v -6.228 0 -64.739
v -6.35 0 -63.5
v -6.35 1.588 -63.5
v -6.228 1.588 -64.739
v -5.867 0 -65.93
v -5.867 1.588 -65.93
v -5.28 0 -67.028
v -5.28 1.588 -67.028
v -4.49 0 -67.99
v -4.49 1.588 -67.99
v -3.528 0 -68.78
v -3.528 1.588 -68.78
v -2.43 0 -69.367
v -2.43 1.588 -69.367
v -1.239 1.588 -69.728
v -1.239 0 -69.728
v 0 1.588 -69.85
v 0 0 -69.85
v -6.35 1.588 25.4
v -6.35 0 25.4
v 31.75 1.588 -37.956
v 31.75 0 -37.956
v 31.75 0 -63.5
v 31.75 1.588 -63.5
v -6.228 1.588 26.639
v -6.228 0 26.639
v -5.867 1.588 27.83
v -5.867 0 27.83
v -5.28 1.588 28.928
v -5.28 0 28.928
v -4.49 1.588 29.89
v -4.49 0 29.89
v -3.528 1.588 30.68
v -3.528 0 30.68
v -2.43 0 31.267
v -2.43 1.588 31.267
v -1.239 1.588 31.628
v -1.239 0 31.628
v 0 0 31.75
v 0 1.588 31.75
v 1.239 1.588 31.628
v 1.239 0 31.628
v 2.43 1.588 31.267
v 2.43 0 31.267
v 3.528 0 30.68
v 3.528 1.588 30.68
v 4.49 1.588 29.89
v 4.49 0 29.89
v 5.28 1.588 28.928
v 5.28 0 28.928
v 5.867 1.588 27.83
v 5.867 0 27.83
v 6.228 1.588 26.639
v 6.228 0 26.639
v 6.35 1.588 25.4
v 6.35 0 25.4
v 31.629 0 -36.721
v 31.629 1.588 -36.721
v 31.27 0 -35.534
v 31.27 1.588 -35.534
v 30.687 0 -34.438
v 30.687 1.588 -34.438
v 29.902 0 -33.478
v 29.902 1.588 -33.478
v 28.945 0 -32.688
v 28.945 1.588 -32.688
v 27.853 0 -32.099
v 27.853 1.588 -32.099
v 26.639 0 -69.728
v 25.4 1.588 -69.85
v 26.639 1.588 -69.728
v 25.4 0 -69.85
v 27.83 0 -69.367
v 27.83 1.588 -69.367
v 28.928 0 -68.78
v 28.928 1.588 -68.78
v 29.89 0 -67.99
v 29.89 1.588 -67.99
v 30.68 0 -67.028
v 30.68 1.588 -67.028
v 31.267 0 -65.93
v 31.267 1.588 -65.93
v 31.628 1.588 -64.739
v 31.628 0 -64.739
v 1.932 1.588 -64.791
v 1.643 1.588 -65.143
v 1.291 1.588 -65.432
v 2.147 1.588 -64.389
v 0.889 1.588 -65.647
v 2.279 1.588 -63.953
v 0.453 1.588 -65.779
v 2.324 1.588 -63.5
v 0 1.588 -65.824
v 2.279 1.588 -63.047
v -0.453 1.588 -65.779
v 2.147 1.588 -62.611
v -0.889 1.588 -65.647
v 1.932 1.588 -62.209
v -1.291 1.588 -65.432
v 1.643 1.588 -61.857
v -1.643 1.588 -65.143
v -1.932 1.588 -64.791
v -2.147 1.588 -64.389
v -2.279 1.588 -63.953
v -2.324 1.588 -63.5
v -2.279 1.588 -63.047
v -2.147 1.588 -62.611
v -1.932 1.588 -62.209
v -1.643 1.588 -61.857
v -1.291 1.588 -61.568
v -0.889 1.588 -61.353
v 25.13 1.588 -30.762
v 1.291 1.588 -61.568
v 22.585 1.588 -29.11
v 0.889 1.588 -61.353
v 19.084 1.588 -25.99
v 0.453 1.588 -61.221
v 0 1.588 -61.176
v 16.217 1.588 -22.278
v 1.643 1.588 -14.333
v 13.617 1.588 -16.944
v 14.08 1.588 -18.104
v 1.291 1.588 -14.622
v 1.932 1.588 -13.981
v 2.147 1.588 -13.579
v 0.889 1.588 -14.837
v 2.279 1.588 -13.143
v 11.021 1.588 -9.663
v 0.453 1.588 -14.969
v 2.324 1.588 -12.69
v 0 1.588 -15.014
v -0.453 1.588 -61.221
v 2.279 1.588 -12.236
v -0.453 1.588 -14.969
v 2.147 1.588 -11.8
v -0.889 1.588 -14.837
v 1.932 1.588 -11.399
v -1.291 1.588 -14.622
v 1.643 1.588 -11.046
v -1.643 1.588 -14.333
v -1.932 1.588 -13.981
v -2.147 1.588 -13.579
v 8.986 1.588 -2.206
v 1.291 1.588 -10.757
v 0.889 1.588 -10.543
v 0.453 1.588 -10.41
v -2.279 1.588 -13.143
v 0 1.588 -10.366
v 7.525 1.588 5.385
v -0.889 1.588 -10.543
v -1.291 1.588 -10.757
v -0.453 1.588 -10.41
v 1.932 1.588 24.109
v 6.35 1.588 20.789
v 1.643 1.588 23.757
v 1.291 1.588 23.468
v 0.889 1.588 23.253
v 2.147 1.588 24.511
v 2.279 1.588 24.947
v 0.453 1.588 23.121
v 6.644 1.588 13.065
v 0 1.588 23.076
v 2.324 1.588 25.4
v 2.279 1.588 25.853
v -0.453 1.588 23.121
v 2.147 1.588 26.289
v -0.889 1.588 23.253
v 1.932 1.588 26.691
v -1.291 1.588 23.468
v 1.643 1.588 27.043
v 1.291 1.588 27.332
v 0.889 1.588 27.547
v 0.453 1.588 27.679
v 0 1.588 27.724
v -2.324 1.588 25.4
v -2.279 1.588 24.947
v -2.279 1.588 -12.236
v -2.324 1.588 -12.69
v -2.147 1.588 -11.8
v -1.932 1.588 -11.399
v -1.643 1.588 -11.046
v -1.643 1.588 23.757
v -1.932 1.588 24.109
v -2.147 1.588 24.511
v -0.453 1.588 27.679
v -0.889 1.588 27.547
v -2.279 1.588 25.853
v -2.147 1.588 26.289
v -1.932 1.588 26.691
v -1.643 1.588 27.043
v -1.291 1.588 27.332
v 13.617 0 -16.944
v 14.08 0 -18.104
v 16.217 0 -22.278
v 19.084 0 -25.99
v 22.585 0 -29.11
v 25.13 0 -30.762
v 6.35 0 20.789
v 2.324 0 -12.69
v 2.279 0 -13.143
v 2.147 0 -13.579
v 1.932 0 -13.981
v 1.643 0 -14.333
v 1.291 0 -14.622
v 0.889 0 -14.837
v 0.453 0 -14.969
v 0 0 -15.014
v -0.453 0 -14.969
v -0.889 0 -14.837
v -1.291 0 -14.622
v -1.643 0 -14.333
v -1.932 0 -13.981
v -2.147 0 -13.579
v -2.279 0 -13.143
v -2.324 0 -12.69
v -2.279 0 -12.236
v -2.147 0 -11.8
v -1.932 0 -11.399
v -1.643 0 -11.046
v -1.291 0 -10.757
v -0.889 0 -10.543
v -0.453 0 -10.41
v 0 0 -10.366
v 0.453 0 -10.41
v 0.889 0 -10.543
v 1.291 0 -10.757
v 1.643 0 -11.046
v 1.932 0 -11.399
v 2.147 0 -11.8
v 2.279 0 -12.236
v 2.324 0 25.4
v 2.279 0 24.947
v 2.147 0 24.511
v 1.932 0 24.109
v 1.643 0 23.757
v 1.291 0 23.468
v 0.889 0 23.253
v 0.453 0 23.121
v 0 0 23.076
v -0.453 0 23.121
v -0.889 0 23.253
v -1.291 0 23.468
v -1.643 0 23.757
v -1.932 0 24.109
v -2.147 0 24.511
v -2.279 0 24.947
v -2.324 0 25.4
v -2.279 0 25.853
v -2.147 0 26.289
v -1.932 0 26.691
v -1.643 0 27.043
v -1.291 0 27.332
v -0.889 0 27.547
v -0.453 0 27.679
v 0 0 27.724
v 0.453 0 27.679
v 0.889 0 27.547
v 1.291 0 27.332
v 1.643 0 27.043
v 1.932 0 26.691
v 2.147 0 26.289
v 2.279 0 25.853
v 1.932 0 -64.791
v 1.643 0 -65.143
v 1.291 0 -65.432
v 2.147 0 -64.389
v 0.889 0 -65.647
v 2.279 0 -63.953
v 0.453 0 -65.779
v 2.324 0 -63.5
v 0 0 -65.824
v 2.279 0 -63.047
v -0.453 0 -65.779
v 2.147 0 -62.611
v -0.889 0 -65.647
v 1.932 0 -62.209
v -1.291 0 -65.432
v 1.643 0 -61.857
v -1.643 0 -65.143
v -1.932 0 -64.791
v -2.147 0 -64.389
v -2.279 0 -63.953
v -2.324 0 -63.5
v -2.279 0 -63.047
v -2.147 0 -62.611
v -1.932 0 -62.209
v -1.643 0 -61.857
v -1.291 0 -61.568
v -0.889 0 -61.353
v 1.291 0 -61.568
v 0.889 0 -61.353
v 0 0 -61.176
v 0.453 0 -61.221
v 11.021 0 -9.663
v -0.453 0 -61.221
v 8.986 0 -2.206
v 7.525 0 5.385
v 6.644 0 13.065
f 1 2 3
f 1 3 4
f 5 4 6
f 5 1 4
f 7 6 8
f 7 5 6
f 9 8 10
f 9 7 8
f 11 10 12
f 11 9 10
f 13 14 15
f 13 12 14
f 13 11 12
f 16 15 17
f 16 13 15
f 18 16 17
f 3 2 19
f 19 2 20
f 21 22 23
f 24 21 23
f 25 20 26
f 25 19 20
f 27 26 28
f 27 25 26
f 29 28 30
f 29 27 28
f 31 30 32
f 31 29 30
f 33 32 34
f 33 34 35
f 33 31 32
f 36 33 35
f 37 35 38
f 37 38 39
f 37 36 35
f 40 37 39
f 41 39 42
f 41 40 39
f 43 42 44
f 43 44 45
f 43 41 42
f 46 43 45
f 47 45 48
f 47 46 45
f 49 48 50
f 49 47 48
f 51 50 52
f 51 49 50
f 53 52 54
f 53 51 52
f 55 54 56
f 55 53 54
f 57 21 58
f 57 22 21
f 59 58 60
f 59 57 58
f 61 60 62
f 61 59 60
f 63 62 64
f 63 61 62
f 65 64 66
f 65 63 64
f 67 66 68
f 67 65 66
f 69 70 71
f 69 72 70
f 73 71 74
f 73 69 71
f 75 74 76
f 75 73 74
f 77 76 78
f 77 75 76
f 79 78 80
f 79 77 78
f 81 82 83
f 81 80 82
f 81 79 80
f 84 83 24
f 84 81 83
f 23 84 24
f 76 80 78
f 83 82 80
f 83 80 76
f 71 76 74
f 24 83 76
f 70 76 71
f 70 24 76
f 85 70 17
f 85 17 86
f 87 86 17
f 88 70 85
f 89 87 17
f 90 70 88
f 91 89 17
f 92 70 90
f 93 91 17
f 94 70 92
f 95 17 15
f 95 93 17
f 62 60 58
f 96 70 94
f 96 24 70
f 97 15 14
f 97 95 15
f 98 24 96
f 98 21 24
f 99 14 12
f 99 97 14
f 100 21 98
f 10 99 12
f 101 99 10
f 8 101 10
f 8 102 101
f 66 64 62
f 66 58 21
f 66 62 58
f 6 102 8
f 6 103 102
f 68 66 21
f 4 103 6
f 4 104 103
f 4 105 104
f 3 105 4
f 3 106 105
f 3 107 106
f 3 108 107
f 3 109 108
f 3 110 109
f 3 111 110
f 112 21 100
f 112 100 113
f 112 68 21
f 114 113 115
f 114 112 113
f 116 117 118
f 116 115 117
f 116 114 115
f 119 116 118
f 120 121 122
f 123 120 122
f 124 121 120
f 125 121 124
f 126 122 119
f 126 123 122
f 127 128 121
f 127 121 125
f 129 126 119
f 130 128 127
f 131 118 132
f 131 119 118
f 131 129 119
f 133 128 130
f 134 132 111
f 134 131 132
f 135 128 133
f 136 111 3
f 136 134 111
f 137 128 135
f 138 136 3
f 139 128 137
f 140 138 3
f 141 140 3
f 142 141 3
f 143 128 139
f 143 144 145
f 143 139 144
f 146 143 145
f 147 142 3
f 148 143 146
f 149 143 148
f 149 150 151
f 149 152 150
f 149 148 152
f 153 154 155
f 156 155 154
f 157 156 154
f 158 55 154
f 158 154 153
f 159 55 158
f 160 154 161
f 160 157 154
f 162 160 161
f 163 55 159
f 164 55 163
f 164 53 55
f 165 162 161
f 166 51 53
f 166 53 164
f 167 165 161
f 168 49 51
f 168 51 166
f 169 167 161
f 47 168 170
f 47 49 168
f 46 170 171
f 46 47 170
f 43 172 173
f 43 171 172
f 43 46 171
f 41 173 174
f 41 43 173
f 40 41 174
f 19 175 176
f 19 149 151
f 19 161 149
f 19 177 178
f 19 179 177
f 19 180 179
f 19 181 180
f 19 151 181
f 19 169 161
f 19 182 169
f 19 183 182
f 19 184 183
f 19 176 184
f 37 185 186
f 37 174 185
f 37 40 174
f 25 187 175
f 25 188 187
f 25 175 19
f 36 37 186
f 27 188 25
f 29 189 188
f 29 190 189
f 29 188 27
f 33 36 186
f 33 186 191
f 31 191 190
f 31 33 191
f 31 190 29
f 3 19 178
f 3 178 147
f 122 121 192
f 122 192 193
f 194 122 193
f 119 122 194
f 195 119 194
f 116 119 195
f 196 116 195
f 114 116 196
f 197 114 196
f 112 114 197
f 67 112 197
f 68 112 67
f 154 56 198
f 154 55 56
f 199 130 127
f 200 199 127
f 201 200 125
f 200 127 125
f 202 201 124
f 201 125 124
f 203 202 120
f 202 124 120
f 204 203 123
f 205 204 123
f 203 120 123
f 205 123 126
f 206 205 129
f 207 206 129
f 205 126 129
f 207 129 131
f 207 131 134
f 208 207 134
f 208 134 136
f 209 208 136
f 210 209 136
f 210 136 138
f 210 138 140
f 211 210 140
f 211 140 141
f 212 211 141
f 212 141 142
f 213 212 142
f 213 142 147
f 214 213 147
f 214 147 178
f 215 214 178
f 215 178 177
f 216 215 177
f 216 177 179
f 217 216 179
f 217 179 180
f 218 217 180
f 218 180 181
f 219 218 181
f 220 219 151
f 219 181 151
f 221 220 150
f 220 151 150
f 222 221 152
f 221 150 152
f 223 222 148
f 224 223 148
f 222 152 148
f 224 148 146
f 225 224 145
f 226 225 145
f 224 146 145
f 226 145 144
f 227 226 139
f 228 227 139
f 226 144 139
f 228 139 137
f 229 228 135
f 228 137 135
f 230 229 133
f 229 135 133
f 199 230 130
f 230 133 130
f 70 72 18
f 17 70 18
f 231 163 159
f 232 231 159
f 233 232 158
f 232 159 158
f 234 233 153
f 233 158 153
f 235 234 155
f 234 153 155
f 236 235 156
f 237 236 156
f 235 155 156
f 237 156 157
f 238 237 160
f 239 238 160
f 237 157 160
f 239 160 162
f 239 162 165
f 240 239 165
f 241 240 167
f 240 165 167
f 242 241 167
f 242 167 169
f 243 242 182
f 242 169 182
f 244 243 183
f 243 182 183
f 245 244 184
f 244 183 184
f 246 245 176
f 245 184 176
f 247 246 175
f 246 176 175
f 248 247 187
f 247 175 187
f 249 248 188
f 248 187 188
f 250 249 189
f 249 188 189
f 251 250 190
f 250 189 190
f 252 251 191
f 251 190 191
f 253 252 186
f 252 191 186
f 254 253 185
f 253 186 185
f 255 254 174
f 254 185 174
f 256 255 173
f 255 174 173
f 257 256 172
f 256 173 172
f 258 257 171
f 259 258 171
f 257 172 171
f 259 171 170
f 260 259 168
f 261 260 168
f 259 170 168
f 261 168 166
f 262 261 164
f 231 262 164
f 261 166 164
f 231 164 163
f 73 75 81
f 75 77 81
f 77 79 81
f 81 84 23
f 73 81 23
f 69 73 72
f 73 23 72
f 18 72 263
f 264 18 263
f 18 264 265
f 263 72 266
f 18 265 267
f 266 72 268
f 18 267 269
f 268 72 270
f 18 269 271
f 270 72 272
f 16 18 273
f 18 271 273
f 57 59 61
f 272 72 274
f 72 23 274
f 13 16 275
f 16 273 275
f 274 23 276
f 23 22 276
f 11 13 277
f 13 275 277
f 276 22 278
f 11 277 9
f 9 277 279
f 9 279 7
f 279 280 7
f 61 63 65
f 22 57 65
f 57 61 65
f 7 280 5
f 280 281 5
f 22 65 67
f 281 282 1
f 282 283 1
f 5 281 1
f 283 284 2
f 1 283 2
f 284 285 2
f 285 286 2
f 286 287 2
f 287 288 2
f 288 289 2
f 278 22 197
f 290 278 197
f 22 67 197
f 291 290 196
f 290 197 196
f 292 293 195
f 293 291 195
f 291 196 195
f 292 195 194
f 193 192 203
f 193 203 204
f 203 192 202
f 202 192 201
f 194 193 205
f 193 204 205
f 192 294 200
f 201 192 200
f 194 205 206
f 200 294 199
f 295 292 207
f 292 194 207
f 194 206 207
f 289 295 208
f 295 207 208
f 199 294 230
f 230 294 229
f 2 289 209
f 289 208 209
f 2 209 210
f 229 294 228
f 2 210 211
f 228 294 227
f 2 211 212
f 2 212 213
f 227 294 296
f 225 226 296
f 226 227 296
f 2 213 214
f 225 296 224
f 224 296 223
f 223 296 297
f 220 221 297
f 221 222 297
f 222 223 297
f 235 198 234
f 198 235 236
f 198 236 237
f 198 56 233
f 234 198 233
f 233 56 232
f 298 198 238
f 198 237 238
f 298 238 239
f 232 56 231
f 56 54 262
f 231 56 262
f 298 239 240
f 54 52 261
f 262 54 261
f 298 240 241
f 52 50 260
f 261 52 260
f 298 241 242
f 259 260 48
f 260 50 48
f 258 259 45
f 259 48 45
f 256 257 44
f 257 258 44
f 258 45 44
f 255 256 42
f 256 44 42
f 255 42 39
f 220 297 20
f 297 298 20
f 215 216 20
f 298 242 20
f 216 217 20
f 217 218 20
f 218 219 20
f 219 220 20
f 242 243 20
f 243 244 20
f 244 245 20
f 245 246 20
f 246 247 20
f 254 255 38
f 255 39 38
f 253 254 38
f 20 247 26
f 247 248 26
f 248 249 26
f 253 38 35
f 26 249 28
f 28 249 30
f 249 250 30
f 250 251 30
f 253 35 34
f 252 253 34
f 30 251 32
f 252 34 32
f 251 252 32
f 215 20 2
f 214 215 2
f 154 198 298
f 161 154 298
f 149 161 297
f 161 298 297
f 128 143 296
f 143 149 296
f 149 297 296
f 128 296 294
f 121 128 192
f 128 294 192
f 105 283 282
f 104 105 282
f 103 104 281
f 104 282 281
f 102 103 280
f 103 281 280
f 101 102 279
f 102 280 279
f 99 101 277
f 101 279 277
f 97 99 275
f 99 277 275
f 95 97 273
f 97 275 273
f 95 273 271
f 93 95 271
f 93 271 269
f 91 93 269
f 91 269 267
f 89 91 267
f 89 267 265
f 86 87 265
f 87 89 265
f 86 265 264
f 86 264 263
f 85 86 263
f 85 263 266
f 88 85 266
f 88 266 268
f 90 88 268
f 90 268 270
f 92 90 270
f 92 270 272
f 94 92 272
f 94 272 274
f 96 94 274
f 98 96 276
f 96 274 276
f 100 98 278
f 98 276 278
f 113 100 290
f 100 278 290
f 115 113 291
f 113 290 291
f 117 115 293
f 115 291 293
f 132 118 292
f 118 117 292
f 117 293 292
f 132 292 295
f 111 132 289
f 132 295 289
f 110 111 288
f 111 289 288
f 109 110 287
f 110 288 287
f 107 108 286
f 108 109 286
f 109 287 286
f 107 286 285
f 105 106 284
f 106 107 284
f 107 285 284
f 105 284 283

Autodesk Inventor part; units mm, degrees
ref_plane "YZ Plane" through (0, 0, 0) normal (1, 0, 0) x (0, 1, 0)
ref_plane "XZ Plane" through (0, 0, 0) normal (0, 1, 0) x (-1, 0, 0)
ref_plane "XY Plane" through (0, 0, 0) normal (0, 0, 1) x (1, 0, 0)
sketch "Sketch1" plane through (0, 0, 0) normal (0, 1, 0) x (-1, 0, 0)
  circle A0 centre (0, 0) radius 2.3241
  line L0 (0, 0) -> (0, -63.5)
  circle A1 centre (0, -63.5) radius 2.3241
  line L1 (0, 0) -> (0, -63.5) construction
  line L2 (-6.35, 0) -> (-6.35, -63.5)
  line L3 (6.35, -63.5) -> (6.35, 0)
  arc A2 (6.35, 0) -> (-6.35, 0) centre (0, 0) ccw
  arc A3 (-6.35, -63.5) -> (6.35, -63.5) centre (0, -63.5) ccw
  line L4 (0, -63.5) -> (-15.9411, -63.5) construction
  line L5 (0, -57.15) -> (-15.9411, -57.15)
  line L6 (-15.9411, -69.85) -> (0, -69.85)
  arc A4 (0, -69.85) -> (0, -57.15) centre (0, -63.5) ccw
  arc A5 (-15.9411, -57.15) -> (-15.9411, -69.85) centre (-15.9411, -63.5) ccw
  line L7 (0, -63.5) -> (-25.4, -63.5) construction
  line L8 (0, -57.15) -> (-25.4, -57.15)
  line L9 (-25.4, -69.85) -> (0, -69.85)
  arc A6 (0, -69.85) -> (0, -57.15) centre (0, -63.5) ccw
  arc A7 (-25.4, -57.15) -> (-25.4, -69.85) centre (-25.4, -63.5) ccw
  line L10 (-5.9094, 2.3241) -> (-31.2958, -61.1417)
  line L11 (-25.4, -63.5) -> (-25.4, -37.9561) construction
  line L12 (-19.05, -63.5) -> (-19.05, -37.9561)
  line L13 (-31.75, -37.9561) -> (-31.75, -63.5)
  arc A8 (-31.75, -63.5) -> (-19.05, -63.5) centre (-25.4, -63.5) ccw
  arc A9 (-19.05, -37.9561) -> (-31.75, -37.9561) centre (-25.4, -37.9561) ccw
  line L14 (-27.3182, -31.9028) -> (-18.4799, -29.102)
  point P0 (0, -31.75)
  point P1 (-7.9706, -63.5)
  point P2 (-22.0988, -61.949)
  point P3 (-12.7, -63.5)
  point P4 (-6.35, -57.15)
  point P5 (-25.4, -50.7281)
  dimension "d0" = 4.6482
  dimension "d1" = 63.5
  dimension "d2" = 4.6482
  dimension "d3" = 12.7
  dimension "d6" = 15.9411
  dimension "d7" = 25.4
extrude "Extrusion2" add sketch "Sketch1" along normal blind 1.5875 contours L5 L2 A2 L3 A4 | A4 A3 L2 L5 | L5 L8 L12 A9 L10 A2 L2 | L2 A3 L6 A5 A8 L12 L5 | A5 L12 L8 | L12 A8 A5 | A5 A8 A7 L8 L12 | L8 A7 L10 A9 L12 | L9 A8 A5
extrude "Extrusion3" add sketch "Sketch1" along normal blind 1.5875 contours L10 A9 L14 | L10 A7 L13 A9
fillet "Fillet1" radius 25.4 1 edges at (18.4799, 0.7937, -29.102)
sketch "Sketch2" plane through (0, 1.5875, 0) normal (0, 1, 0) x (1, 0, 0)
  circle A0 centre (0, 0) radius 2.3241 projected
  line L0 (0, 0) -> (0, -25.4)
  line L1 (0, -25.4) -> (0, 0) construction
  line L2 (6.35, -25.4) -> (6.35, 0)
  line L3 (-6.35, 0) -> (-6.35, -25.4)
  arc A1 (-6.35, -25.4) -> (6.35, -25.4) centre (0, -25.4) ccw
  arc A2 (6.35, 0) -> (-6.35, 0) centre (0, 0) ccw
  circle A3 centre (0, -25.4) radius 2.3241
  line L4 (0, 0) -> (0, 12.6898)
  circle A4 centre (0, 12.6898) radius 2.3241
  point P0 (0, -12.7)
  dimension "d13" = 25.4
  dimension "d17" = 4.6482
  dimension "d20" = 4.6482
extrude "Extrusion4" add sketch "Sketch2" against normal blind 1.5875 contours A0 L0 L4 | A3 | A2 L2 A1 L3 | L4 L0 A0
fillet "Fillet2" radius 101.6 1 edges at (6.35, 0.7937, 1.2226)
extrude "Extrusion5" cut sketch "Sketch2" against normal blind 1.5875 contours A3
extrude "Extrusion6" cut sketch "Sketch2" against normal blind 1.5875 contours A4
properties part number "Lady Brown Tab Top"
